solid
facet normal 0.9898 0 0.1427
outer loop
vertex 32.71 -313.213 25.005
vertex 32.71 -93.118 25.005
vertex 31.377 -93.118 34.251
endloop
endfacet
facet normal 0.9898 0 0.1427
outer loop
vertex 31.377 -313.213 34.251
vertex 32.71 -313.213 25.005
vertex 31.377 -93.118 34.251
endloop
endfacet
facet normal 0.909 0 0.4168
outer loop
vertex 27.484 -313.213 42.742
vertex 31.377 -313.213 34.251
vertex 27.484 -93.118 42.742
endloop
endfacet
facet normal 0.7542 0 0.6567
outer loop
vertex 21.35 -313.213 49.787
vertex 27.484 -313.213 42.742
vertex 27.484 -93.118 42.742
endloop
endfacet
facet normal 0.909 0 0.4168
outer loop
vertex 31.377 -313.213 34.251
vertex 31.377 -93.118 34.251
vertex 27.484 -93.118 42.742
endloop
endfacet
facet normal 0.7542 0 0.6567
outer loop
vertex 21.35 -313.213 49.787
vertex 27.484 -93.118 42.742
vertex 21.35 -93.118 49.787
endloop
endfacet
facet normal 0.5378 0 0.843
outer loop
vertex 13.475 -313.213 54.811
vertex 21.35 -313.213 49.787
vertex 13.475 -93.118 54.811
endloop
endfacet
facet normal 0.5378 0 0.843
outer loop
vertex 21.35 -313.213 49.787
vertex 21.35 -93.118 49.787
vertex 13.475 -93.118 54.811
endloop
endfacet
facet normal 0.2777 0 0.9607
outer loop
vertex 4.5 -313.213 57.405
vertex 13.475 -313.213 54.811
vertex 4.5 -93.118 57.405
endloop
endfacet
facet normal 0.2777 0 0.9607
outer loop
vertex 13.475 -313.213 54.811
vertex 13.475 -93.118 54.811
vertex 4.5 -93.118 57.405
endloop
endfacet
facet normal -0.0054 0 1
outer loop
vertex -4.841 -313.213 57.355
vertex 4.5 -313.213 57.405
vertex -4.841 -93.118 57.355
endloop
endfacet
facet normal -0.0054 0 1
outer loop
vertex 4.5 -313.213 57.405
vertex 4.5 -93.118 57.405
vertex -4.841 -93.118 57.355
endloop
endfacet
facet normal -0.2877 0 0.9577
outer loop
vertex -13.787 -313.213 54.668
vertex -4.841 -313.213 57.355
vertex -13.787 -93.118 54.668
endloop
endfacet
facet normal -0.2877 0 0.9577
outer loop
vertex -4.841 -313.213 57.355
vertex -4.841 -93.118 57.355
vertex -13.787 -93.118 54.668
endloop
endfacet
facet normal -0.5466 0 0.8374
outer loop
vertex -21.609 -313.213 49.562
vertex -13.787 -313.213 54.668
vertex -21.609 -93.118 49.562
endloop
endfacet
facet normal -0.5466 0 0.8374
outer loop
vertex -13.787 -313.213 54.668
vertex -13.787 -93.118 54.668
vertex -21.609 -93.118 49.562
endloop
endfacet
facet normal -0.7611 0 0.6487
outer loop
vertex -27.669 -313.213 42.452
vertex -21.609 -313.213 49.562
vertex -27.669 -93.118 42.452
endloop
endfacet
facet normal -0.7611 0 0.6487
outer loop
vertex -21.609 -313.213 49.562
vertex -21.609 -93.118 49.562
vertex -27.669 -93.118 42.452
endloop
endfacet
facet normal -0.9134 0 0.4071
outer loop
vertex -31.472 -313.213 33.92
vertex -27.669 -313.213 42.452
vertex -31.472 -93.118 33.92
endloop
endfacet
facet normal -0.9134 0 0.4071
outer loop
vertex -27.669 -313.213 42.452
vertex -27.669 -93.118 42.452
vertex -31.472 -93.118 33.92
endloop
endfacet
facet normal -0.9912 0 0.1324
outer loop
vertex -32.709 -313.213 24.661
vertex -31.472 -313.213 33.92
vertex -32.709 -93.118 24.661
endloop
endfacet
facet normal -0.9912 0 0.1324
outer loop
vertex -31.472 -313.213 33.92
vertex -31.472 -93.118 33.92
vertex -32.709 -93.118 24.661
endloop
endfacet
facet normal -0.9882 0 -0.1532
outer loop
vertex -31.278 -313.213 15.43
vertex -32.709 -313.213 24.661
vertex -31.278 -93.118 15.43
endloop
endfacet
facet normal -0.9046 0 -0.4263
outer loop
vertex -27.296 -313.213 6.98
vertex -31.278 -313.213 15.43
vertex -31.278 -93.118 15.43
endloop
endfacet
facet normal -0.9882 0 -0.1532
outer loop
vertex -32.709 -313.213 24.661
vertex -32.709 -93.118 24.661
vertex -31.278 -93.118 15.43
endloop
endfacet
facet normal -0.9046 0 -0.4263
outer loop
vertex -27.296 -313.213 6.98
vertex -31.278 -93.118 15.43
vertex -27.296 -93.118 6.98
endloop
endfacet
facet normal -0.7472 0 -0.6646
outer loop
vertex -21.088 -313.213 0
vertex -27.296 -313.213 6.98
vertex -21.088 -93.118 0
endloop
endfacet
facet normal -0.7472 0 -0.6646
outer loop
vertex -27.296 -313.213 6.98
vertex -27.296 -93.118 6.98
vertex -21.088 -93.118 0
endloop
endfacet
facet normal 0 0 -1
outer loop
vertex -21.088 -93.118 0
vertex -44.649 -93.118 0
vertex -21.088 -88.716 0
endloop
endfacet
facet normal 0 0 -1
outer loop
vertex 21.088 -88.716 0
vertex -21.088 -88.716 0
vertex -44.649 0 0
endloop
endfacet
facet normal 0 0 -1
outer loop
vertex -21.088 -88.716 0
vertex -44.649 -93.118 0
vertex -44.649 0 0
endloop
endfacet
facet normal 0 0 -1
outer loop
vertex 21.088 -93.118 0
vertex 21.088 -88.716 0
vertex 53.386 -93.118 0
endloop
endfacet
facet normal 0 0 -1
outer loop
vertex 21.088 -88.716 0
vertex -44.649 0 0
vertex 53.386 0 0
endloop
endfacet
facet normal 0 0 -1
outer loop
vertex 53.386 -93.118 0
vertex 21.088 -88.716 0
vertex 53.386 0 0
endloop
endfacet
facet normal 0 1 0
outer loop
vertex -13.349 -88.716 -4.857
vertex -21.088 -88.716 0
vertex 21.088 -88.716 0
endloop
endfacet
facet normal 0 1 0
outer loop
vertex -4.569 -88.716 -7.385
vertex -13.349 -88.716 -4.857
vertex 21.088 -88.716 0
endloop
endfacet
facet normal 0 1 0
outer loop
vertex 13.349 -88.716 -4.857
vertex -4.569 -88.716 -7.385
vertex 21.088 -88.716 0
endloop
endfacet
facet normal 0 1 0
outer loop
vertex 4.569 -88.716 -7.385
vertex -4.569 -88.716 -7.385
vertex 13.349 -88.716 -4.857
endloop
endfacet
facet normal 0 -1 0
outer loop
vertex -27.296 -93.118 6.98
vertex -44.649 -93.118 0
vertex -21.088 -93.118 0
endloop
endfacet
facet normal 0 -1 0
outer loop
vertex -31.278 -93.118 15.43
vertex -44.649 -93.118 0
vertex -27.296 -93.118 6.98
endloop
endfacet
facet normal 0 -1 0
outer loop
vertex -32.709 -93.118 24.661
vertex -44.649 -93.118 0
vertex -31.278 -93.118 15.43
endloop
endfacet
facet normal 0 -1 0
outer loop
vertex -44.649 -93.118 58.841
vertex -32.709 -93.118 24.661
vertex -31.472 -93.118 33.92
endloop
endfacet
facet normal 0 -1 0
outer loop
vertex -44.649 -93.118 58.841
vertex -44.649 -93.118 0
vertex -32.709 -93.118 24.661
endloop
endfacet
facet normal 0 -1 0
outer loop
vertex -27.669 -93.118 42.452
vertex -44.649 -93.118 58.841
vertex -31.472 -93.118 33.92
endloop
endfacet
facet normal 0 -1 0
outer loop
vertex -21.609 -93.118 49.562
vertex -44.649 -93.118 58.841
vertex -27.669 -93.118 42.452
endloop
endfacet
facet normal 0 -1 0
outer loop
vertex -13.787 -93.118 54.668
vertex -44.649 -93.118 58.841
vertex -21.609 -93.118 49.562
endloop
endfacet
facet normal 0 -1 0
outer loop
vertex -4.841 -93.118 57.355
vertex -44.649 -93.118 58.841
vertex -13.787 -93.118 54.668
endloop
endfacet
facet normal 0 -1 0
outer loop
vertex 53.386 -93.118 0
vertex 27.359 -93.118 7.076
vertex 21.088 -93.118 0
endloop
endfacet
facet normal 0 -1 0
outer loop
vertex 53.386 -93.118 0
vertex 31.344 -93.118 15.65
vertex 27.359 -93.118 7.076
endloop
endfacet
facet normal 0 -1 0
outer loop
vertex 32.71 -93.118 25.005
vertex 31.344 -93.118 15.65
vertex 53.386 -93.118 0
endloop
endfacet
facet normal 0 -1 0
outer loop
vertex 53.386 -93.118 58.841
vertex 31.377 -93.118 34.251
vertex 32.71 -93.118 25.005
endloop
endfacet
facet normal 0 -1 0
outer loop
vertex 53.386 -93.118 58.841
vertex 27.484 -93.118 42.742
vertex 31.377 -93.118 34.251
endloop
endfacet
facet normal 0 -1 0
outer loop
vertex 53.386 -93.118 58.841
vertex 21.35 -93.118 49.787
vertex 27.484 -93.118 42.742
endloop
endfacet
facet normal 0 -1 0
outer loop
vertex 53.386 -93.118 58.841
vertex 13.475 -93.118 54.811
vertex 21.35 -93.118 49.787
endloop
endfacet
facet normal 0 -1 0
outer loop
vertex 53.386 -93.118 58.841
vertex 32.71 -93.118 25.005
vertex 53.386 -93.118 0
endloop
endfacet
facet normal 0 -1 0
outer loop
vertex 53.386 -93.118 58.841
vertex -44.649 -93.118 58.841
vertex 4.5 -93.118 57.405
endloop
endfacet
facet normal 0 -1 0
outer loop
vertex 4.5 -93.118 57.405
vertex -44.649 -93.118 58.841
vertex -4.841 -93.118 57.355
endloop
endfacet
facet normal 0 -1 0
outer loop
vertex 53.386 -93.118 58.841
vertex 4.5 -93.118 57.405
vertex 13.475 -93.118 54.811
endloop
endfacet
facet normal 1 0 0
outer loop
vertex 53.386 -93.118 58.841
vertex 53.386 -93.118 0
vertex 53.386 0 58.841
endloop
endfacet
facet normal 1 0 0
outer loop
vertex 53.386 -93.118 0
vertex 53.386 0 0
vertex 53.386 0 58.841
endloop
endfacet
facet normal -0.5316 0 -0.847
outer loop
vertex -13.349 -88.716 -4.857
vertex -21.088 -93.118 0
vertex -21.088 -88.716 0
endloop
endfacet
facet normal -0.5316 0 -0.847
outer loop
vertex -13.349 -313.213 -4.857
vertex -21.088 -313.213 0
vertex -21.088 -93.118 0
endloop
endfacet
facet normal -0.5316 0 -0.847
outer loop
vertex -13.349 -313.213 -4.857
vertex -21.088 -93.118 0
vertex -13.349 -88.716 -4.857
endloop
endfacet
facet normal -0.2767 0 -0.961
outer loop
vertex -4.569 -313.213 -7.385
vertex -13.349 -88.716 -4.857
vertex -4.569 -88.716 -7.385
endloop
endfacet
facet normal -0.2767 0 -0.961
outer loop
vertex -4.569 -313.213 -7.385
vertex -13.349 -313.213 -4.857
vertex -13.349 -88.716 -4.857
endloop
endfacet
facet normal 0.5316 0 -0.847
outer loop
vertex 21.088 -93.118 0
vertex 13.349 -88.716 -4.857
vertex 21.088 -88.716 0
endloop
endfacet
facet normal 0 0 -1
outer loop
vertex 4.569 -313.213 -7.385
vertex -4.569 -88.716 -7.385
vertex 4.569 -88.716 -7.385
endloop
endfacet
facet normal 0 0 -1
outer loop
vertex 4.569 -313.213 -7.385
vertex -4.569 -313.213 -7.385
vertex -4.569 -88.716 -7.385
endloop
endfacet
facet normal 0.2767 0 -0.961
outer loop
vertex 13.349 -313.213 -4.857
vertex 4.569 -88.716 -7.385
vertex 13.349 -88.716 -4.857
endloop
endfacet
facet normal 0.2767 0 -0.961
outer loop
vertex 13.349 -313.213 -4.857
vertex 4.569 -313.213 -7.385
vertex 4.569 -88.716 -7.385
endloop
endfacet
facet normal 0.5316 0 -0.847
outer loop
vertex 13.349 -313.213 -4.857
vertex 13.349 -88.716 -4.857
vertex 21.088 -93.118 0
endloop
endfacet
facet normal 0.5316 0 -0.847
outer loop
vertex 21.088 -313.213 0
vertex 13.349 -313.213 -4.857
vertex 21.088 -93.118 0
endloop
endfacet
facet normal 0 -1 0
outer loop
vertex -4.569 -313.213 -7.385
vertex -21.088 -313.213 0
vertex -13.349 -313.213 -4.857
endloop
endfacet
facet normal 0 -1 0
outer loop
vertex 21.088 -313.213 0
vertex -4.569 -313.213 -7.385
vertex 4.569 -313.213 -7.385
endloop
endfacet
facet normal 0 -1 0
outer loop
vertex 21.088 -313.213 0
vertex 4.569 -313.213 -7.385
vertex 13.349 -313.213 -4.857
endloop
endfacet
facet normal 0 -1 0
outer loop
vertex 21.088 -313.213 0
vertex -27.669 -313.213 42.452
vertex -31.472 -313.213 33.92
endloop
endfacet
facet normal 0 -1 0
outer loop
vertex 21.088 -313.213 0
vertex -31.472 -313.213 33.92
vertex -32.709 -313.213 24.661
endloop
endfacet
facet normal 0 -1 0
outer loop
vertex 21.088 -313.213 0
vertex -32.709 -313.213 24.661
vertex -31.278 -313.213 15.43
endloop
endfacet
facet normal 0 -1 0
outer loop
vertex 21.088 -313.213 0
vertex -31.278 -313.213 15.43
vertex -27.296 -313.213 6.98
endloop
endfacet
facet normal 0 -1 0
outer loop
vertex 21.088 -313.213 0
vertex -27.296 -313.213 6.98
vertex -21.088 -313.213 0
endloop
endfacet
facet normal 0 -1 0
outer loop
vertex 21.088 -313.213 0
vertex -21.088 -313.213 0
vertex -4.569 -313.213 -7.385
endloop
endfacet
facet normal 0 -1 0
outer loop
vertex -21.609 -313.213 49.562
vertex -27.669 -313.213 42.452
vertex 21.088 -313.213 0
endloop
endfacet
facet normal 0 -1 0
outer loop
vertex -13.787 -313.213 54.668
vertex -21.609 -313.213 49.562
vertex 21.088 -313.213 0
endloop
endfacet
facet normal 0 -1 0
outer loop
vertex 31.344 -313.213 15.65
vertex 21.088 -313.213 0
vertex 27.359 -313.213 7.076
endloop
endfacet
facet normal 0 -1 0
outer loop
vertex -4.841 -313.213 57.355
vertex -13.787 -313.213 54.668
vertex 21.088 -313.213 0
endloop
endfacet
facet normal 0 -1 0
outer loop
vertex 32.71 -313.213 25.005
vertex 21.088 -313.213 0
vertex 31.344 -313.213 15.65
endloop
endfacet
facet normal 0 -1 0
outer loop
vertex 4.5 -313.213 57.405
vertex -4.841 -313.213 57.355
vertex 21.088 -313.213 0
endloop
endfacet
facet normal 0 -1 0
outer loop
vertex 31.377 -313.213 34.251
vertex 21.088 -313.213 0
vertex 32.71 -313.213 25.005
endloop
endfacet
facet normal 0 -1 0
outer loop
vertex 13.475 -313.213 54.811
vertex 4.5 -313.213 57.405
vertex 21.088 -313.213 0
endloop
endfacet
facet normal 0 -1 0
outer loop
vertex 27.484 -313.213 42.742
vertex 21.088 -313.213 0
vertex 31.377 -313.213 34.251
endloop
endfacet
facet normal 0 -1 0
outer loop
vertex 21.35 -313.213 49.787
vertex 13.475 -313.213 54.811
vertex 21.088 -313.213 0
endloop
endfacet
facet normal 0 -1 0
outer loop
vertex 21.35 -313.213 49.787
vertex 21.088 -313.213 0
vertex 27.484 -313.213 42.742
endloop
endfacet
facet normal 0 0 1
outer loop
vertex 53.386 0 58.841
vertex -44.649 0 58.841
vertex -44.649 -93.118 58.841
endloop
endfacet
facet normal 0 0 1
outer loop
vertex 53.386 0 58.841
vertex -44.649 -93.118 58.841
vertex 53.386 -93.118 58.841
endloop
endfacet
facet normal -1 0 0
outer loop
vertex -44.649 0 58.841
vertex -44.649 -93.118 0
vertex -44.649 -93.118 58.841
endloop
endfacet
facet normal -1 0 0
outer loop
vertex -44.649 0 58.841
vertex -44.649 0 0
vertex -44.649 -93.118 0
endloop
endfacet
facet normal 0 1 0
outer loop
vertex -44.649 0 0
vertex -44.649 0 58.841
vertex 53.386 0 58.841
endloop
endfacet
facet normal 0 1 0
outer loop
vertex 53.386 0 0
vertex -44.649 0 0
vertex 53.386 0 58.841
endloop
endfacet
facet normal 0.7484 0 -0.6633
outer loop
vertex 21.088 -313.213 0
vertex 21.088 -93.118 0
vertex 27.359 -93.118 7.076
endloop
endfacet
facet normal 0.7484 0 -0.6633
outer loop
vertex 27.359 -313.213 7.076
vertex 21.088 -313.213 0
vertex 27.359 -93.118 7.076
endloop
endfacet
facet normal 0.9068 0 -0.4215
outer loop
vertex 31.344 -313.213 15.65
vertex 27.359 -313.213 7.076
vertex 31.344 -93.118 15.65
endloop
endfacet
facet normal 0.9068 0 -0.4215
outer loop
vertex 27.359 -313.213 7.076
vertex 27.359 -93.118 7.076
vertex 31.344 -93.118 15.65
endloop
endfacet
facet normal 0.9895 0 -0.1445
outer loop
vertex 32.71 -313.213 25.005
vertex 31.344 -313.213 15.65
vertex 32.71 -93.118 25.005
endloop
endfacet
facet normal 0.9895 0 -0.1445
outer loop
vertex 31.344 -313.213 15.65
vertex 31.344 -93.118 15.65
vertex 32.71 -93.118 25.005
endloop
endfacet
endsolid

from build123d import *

# Parameters (mm, degrees)
F0_W     = 98.0357304215
F0_H     = 58.8409267366
F1_DEPTH = 25.4
F2_DEPTH = 67.7178427577
F4_DEPTH = 220.0948596001
F5_R     = 19.1741930287
F6_DEPTH = 130.0617903471
F7_DEPTH = 224.4969811291


with BuildPart() as f1:
    # F0 (on Front) → F1 (new body)
    with BuildSketch(Plane.XZ):
        with Locations((4.3684653938, 29.4204633683)):
            Rectangle(F0_W, F0_H)
    extrude(amount=F1_DEPTH)

    # F2 (add): a face of the model
    f2_faces = [f1.faces().sort_by_distance(p)[0] for p in [
        (4.3684653938, -25.4, 29.4204633683),
    ]]
    extrude(f2_faces, amount=F2_DEPTH)

    # F3 (on face) → F4 (join)
    with BuildSketch(Plane.XZ.offset(93.1178427577)):
        with BuildLine():
            Line((21.0881105967, 0), (-21.0881105967, 0))
            ThreePointArc((-21.0881105967, 0), (0, -7.7051669547), (21.0881105967, 0))
        make_face()
        with BuildLine():
            ThreePointArc((21.0881105967, 0), (29.6628537968, 11.2181038734), (32.7103883216, 25.0052213669))
            ThreePointArc((32.7103883216, 25.0052213669), (-13.7871174935, 54.6680751636), (-21.0881105967, 0))
            Line((-21.0881105967, 0), (21.0881105967, 0))
        make_face()
    extrude(amount=F4_DEPTH)

    # F5 (on face) → F6 (join)
    with BuildSketch(Plane.XZ.offset(313.2127023578)):
        with Locations((0, 25.0052213669)):
            Circle(F5_R)
    extrude(amount=-F6_DEPTH)

    # F7 (add): a face of the model
    f7_faces = [f1.faces().sort_by_distance(p)[0] for p in [
        (0, -313.2127023578, 25.0052213669),
    ]]
    extrude(f7_faces, amount=-F7_DEPTH)


solid = f1.part
